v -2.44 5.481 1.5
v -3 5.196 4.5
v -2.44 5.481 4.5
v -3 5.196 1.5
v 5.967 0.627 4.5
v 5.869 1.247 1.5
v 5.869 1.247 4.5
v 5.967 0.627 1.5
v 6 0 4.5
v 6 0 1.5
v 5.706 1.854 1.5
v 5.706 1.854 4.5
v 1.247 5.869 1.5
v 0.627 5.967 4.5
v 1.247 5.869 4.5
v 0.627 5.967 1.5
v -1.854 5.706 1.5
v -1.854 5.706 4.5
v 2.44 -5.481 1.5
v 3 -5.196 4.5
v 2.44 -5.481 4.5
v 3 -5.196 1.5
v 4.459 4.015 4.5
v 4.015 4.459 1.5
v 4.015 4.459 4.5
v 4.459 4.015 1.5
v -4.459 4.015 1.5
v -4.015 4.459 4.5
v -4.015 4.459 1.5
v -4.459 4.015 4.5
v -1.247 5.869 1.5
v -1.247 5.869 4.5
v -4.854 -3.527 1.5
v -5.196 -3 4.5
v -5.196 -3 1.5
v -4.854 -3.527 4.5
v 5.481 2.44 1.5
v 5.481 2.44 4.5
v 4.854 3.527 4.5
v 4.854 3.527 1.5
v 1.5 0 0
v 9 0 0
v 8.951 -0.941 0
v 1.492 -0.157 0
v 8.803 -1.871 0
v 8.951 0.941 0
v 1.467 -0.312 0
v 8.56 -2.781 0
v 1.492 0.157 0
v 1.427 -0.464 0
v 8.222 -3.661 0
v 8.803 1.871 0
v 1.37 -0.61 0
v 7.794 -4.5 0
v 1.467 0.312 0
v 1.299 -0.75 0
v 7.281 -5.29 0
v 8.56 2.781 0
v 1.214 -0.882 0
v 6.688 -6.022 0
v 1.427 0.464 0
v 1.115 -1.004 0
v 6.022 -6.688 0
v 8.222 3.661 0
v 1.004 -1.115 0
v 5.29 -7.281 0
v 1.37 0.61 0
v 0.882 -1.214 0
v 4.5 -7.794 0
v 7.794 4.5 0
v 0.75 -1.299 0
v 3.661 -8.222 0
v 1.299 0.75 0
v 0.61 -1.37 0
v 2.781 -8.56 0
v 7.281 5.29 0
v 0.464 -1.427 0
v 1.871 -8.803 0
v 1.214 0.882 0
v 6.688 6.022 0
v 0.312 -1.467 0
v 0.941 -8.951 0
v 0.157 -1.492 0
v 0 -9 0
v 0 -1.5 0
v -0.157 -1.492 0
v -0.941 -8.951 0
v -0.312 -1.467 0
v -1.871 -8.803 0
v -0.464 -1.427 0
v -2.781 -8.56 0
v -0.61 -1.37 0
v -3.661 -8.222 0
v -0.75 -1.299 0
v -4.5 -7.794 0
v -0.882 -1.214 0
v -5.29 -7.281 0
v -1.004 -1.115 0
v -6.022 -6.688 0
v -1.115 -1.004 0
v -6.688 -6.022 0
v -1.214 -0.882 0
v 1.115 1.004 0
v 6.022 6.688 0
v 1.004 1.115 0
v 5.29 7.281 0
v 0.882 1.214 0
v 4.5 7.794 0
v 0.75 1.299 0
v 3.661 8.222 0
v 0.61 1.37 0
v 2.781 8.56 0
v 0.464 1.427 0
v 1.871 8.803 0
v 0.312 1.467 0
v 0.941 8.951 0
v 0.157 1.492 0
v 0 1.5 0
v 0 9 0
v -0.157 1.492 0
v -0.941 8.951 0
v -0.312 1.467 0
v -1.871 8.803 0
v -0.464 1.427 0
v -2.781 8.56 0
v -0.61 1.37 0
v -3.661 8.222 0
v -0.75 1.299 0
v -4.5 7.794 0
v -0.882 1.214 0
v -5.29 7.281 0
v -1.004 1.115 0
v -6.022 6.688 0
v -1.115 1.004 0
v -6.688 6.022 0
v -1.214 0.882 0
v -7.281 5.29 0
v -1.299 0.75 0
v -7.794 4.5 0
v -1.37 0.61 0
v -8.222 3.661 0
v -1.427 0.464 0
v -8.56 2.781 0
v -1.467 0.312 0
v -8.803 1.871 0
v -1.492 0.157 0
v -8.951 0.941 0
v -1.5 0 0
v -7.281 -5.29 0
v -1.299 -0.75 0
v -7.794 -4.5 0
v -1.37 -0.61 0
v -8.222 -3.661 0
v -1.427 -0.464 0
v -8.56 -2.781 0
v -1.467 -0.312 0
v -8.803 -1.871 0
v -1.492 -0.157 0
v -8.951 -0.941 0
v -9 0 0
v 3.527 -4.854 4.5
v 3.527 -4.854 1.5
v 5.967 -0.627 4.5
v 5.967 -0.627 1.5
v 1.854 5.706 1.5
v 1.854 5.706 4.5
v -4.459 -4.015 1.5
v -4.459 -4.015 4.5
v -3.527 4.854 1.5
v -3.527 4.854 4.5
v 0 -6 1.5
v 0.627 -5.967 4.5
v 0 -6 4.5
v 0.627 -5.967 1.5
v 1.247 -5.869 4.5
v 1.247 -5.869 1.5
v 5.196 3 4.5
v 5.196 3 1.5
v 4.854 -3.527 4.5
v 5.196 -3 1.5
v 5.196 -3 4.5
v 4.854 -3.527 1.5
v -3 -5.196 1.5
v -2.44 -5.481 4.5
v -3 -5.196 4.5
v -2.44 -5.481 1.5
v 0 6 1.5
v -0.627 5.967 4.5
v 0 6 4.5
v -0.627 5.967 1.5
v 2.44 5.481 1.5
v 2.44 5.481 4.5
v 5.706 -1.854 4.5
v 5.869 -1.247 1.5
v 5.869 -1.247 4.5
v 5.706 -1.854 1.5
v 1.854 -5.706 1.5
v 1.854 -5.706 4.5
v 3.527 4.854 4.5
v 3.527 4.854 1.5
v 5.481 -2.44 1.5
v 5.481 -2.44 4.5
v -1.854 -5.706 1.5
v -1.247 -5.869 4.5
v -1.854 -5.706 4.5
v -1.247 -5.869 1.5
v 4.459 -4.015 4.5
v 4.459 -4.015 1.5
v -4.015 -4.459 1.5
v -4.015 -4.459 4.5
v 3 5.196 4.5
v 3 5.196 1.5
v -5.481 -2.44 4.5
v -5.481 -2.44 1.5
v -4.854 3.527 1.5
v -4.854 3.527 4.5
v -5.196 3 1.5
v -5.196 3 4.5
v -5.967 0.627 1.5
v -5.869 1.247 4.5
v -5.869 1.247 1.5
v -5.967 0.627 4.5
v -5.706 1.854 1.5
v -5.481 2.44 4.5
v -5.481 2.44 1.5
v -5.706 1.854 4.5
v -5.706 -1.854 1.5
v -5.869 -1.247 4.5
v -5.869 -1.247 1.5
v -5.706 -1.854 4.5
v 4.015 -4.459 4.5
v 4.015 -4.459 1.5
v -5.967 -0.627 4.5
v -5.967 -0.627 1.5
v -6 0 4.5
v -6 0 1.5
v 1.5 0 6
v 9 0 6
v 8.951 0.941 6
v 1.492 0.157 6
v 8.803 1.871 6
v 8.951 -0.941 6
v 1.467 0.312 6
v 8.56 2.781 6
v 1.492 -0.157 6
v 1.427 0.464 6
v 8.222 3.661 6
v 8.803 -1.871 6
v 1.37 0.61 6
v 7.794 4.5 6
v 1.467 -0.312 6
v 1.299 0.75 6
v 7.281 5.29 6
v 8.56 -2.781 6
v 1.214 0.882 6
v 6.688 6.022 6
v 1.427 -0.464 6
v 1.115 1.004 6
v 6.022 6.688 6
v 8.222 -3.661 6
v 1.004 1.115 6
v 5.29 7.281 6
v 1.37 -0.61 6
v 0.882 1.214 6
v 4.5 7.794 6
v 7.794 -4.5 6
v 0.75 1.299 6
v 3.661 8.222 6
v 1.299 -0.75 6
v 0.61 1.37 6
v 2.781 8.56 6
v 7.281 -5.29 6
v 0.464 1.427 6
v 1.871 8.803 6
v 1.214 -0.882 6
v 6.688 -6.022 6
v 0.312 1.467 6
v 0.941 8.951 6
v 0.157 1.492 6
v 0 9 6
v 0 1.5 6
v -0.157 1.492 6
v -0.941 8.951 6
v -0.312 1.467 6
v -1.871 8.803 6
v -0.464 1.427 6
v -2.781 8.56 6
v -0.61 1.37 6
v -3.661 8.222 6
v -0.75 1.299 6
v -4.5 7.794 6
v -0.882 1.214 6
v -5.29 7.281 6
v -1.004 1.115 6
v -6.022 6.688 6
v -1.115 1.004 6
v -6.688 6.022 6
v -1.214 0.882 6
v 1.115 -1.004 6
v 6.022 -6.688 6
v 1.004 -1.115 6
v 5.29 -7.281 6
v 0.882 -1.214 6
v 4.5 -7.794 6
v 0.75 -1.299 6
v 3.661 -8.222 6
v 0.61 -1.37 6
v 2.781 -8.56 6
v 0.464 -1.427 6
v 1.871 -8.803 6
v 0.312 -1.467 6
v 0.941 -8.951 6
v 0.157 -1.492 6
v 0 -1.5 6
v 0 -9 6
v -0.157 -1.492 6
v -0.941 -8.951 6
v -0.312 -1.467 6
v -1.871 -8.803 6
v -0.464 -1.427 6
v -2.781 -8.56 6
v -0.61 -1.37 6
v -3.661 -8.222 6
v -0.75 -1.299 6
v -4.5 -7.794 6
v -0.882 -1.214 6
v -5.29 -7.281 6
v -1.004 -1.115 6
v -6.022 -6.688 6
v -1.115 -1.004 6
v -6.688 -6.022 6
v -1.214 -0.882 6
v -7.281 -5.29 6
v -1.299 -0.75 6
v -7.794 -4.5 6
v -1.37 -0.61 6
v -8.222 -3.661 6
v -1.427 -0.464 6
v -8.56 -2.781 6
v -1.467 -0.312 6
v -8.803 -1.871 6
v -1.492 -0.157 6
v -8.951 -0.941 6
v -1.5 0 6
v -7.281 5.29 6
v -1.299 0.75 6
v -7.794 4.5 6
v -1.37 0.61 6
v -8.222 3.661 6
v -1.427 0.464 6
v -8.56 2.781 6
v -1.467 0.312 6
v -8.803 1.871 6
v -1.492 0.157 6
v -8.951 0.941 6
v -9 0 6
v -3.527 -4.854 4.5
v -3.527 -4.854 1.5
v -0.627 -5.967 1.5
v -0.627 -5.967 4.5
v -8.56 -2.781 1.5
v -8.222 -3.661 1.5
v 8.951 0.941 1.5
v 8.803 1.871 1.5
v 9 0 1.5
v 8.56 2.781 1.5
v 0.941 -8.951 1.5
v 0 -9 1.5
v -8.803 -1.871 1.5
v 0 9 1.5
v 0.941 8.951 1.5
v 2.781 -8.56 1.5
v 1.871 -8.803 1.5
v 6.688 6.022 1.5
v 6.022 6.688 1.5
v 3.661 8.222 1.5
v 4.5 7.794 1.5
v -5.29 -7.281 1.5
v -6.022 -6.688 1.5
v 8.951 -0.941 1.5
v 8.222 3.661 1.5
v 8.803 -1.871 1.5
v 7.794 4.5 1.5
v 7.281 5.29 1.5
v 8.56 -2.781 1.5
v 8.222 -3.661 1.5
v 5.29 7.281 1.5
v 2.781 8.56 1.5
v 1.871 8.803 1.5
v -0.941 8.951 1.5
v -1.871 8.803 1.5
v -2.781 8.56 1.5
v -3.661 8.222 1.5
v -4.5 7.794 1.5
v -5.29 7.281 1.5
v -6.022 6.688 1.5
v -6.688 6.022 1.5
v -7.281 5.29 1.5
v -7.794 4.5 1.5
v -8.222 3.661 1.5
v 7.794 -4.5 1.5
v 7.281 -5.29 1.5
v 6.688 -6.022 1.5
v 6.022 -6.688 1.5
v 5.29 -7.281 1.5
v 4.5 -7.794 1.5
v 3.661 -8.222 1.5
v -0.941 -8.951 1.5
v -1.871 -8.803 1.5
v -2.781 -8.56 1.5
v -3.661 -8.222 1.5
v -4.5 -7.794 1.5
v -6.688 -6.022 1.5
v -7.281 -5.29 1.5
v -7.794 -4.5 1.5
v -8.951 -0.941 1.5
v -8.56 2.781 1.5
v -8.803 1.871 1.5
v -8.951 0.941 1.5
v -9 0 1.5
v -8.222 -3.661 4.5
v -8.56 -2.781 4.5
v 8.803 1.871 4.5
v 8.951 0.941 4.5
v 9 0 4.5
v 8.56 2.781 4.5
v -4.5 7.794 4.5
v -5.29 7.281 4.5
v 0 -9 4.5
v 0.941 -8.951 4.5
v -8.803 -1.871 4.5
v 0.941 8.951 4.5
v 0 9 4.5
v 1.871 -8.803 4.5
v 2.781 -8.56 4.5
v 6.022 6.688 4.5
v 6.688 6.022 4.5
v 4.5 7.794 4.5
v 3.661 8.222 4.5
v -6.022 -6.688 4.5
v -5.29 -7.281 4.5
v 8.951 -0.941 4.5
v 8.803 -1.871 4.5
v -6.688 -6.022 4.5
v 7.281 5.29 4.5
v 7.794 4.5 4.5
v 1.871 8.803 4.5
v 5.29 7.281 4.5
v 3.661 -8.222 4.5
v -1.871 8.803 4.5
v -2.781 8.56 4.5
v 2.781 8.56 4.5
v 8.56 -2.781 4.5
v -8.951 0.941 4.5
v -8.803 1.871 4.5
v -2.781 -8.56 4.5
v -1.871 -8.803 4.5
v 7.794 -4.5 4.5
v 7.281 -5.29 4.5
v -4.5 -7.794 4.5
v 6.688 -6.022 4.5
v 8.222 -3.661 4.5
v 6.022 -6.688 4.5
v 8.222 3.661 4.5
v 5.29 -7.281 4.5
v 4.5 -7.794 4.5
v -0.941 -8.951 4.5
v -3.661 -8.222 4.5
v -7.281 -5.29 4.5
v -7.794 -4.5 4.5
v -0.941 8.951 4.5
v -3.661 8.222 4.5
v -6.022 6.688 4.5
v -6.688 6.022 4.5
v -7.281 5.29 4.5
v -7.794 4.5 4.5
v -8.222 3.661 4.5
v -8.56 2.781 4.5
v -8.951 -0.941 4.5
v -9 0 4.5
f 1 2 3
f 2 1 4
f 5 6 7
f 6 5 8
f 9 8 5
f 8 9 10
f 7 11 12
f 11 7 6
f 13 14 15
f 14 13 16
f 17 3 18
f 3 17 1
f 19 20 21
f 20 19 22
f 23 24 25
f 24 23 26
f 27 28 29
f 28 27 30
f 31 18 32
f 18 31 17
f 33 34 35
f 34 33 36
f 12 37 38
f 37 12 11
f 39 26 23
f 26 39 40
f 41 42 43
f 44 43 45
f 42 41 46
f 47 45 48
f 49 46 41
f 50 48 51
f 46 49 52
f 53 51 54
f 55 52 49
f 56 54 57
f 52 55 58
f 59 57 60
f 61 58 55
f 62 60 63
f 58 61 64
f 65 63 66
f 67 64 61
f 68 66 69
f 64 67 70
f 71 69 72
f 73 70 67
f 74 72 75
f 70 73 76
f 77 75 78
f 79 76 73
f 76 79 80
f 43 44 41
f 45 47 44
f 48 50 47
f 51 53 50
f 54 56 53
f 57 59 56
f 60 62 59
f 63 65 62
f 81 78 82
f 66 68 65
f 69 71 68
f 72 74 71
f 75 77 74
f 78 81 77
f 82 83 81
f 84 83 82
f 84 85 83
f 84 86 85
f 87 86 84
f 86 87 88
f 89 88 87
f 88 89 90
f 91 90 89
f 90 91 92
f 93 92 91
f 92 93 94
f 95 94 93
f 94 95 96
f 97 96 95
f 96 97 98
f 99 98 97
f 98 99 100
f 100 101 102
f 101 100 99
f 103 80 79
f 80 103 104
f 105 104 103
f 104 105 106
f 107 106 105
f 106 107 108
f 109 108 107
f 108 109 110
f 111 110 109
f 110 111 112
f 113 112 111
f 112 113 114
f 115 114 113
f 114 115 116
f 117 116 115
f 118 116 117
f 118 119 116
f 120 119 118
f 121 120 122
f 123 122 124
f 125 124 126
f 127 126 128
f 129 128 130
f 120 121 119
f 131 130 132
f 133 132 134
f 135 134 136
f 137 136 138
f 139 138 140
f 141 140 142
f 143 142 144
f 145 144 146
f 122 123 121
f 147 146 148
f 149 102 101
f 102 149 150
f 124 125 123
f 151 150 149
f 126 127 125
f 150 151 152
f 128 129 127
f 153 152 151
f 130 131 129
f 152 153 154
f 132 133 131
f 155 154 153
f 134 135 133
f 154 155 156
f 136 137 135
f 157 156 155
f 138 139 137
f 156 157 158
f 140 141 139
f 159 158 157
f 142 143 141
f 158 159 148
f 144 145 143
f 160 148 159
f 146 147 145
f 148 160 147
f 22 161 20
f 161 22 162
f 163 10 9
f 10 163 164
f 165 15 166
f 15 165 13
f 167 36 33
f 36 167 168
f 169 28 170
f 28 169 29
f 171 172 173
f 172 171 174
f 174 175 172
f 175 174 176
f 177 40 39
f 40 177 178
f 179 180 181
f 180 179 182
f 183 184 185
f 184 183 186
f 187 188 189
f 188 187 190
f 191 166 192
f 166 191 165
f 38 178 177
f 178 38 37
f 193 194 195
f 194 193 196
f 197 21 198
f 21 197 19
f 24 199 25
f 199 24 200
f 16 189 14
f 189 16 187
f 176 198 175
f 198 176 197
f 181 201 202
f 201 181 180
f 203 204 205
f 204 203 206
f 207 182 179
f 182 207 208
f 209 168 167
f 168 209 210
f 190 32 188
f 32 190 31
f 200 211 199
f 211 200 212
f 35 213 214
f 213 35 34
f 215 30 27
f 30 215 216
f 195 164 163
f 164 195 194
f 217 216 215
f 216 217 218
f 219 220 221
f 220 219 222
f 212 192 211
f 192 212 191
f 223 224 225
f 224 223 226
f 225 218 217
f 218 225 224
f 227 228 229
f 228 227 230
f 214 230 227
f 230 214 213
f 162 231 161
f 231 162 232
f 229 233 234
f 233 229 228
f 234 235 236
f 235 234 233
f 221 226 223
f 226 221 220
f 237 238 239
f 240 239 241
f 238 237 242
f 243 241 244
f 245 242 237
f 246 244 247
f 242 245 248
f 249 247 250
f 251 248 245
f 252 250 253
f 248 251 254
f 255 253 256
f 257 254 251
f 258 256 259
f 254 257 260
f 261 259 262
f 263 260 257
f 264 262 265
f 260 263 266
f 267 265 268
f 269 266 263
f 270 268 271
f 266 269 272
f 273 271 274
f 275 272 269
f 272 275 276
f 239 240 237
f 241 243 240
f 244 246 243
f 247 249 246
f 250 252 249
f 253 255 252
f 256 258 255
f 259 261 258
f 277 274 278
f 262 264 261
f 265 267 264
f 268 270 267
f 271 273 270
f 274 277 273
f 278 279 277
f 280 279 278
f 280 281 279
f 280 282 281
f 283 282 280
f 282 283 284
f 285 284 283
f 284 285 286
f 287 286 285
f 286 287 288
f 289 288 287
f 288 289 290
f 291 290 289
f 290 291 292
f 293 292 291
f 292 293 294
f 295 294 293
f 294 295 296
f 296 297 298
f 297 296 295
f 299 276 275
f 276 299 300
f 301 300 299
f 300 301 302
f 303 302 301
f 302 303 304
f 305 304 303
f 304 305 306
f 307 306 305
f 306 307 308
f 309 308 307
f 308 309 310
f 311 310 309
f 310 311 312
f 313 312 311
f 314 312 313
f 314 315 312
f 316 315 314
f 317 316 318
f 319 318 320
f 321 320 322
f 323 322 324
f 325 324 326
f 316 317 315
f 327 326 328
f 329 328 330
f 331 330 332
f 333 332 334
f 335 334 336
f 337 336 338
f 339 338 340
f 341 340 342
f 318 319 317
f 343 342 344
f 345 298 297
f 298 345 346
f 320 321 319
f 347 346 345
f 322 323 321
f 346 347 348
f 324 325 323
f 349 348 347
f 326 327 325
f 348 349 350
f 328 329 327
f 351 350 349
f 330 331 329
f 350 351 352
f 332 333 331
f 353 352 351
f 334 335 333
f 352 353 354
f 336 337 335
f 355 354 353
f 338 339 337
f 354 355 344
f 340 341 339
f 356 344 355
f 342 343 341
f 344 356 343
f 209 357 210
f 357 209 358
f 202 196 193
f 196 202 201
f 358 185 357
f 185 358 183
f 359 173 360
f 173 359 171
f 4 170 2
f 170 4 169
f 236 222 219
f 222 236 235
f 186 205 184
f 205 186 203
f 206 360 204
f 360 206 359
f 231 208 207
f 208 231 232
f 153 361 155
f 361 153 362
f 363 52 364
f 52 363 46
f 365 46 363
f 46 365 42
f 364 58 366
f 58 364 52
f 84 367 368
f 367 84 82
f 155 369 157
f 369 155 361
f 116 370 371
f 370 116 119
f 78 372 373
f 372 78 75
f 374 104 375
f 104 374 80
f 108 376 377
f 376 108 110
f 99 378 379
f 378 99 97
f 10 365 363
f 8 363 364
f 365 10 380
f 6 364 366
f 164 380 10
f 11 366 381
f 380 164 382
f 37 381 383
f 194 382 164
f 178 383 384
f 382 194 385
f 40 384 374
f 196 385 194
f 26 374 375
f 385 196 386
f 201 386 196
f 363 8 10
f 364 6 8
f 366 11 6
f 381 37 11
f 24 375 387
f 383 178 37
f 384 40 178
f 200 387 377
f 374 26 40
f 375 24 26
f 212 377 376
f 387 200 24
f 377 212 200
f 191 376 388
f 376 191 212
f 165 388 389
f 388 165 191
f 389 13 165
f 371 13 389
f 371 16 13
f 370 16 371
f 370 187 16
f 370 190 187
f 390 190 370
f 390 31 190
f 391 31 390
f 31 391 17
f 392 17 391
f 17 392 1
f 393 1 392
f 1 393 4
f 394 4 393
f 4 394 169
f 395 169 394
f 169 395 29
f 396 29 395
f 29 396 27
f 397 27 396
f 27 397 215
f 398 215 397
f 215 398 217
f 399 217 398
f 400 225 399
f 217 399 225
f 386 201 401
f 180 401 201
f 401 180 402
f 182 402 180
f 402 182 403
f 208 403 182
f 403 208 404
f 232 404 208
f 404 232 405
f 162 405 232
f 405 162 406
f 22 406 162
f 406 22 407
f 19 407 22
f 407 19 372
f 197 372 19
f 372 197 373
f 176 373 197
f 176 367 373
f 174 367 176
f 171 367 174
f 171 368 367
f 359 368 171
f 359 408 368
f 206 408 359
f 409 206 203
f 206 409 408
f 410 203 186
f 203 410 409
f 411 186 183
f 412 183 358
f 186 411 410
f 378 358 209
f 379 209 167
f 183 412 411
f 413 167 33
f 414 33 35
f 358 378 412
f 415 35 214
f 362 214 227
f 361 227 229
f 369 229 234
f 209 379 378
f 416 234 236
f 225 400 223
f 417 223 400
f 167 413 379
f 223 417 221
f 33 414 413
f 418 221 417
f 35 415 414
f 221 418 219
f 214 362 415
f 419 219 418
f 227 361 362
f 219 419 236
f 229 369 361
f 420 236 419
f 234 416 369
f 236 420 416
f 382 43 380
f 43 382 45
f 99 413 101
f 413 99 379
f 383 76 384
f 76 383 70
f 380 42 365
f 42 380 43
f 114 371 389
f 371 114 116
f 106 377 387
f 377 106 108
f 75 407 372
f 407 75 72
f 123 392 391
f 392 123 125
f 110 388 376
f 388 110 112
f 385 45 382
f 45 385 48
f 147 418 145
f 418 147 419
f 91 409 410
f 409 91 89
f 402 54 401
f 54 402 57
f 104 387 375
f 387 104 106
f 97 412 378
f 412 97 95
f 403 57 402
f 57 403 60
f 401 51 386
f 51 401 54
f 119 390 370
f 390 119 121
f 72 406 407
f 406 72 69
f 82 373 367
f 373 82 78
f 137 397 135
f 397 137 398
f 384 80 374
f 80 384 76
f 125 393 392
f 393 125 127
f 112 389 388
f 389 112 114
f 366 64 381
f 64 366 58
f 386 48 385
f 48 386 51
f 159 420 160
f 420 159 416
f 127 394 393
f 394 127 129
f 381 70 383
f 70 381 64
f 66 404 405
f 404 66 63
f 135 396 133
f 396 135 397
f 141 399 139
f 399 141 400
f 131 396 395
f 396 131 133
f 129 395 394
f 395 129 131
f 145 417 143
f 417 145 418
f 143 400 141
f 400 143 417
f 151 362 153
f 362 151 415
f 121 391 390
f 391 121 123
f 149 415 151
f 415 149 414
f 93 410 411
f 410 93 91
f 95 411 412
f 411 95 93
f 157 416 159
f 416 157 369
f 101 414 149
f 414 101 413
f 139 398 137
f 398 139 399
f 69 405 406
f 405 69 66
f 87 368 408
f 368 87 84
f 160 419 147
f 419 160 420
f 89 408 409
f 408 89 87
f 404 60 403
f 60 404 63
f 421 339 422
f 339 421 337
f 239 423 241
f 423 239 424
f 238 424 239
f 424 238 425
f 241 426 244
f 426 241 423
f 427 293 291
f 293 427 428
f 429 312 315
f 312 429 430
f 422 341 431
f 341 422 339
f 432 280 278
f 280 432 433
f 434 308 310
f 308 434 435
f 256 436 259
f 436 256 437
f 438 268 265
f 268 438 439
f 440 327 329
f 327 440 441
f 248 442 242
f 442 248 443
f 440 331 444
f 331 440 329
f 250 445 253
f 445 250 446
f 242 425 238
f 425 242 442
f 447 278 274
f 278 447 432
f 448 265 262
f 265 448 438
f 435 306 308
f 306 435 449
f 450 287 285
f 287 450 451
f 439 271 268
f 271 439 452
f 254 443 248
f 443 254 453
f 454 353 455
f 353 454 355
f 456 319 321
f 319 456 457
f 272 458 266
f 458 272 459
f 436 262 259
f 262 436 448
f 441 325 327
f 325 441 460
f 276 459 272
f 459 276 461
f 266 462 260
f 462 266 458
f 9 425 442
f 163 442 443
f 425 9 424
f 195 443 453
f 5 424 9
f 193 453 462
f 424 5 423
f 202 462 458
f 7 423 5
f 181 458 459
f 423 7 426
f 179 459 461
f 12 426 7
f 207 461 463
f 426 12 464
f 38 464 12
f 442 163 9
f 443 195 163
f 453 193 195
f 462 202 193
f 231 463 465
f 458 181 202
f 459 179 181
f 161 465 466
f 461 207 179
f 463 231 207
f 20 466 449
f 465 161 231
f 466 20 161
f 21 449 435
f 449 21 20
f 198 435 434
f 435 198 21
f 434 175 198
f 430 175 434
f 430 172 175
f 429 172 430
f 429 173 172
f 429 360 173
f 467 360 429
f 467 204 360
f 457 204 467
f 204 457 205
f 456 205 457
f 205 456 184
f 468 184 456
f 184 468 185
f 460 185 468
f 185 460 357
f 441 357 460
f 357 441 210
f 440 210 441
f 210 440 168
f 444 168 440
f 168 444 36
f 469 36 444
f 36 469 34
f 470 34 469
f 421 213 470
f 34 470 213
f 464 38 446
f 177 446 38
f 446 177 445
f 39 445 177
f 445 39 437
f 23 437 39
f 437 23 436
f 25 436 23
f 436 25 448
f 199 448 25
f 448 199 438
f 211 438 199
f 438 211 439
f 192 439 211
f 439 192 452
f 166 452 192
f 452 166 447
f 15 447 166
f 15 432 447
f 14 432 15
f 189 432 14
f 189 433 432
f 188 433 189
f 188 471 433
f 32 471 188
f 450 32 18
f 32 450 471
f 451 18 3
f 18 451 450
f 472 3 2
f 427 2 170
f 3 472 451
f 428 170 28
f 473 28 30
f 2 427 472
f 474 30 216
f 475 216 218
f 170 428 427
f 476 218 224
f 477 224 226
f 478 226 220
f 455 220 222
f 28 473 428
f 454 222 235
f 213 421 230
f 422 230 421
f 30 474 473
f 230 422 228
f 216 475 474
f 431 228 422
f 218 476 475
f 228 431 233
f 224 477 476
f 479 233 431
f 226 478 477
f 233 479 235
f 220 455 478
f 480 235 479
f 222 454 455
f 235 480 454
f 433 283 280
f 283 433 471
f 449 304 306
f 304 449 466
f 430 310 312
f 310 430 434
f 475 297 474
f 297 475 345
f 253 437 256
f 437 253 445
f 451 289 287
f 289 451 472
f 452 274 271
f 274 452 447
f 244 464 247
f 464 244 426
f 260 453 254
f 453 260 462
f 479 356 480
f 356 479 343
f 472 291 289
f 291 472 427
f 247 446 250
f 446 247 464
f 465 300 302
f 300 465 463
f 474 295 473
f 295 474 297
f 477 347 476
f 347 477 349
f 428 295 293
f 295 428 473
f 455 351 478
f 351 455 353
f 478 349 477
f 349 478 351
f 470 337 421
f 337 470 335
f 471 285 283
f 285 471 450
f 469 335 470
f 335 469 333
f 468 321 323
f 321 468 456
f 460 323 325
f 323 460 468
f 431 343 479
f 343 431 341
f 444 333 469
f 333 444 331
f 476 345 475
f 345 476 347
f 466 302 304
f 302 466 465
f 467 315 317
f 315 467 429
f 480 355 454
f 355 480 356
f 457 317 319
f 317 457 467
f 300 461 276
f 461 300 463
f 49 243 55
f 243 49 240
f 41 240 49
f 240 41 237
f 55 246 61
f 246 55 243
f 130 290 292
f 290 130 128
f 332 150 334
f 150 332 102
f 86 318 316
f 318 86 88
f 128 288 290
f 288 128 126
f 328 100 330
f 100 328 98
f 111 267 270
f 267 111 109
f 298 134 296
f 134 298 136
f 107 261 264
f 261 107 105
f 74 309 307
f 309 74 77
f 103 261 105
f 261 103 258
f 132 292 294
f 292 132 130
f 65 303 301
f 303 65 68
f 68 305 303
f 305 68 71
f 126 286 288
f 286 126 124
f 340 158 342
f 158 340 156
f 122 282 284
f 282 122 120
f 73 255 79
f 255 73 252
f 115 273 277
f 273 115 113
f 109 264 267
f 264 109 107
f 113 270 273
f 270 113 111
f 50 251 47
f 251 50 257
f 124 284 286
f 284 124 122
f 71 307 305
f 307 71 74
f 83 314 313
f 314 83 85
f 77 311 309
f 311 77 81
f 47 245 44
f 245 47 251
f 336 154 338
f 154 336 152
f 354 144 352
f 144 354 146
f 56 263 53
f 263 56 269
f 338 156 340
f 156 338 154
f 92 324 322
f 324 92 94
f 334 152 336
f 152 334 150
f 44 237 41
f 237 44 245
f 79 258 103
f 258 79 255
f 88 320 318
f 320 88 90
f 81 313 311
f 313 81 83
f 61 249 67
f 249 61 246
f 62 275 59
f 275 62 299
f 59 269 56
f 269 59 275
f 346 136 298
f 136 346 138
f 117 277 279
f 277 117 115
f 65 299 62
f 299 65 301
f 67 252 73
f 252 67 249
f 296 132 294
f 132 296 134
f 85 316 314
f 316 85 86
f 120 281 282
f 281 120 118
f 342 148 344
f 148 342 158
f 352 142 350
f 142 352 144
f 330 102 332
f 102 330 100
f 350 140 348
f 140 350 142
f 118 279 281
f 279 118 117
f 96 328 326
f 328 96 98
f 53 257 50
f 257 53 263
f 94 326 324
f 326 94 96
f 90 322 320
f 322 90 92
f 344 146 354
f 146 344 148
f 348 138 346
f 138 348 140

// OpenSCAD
// Belt-guide pulley flange.
$fn = 60;
eps = 0.02;
bore_d = 3;
body_d = 12;
width = 6;
difference() { union() { cylinder(d=body_d,h=width); cylinder(d=body_d+6,h=1.5); translate([0,0,width-1.5]) cylinder(d=body_d+6,h=1.5); } translate([0,0,-eps]) cylinder(d=bore_d,h=width+2*eps); }
